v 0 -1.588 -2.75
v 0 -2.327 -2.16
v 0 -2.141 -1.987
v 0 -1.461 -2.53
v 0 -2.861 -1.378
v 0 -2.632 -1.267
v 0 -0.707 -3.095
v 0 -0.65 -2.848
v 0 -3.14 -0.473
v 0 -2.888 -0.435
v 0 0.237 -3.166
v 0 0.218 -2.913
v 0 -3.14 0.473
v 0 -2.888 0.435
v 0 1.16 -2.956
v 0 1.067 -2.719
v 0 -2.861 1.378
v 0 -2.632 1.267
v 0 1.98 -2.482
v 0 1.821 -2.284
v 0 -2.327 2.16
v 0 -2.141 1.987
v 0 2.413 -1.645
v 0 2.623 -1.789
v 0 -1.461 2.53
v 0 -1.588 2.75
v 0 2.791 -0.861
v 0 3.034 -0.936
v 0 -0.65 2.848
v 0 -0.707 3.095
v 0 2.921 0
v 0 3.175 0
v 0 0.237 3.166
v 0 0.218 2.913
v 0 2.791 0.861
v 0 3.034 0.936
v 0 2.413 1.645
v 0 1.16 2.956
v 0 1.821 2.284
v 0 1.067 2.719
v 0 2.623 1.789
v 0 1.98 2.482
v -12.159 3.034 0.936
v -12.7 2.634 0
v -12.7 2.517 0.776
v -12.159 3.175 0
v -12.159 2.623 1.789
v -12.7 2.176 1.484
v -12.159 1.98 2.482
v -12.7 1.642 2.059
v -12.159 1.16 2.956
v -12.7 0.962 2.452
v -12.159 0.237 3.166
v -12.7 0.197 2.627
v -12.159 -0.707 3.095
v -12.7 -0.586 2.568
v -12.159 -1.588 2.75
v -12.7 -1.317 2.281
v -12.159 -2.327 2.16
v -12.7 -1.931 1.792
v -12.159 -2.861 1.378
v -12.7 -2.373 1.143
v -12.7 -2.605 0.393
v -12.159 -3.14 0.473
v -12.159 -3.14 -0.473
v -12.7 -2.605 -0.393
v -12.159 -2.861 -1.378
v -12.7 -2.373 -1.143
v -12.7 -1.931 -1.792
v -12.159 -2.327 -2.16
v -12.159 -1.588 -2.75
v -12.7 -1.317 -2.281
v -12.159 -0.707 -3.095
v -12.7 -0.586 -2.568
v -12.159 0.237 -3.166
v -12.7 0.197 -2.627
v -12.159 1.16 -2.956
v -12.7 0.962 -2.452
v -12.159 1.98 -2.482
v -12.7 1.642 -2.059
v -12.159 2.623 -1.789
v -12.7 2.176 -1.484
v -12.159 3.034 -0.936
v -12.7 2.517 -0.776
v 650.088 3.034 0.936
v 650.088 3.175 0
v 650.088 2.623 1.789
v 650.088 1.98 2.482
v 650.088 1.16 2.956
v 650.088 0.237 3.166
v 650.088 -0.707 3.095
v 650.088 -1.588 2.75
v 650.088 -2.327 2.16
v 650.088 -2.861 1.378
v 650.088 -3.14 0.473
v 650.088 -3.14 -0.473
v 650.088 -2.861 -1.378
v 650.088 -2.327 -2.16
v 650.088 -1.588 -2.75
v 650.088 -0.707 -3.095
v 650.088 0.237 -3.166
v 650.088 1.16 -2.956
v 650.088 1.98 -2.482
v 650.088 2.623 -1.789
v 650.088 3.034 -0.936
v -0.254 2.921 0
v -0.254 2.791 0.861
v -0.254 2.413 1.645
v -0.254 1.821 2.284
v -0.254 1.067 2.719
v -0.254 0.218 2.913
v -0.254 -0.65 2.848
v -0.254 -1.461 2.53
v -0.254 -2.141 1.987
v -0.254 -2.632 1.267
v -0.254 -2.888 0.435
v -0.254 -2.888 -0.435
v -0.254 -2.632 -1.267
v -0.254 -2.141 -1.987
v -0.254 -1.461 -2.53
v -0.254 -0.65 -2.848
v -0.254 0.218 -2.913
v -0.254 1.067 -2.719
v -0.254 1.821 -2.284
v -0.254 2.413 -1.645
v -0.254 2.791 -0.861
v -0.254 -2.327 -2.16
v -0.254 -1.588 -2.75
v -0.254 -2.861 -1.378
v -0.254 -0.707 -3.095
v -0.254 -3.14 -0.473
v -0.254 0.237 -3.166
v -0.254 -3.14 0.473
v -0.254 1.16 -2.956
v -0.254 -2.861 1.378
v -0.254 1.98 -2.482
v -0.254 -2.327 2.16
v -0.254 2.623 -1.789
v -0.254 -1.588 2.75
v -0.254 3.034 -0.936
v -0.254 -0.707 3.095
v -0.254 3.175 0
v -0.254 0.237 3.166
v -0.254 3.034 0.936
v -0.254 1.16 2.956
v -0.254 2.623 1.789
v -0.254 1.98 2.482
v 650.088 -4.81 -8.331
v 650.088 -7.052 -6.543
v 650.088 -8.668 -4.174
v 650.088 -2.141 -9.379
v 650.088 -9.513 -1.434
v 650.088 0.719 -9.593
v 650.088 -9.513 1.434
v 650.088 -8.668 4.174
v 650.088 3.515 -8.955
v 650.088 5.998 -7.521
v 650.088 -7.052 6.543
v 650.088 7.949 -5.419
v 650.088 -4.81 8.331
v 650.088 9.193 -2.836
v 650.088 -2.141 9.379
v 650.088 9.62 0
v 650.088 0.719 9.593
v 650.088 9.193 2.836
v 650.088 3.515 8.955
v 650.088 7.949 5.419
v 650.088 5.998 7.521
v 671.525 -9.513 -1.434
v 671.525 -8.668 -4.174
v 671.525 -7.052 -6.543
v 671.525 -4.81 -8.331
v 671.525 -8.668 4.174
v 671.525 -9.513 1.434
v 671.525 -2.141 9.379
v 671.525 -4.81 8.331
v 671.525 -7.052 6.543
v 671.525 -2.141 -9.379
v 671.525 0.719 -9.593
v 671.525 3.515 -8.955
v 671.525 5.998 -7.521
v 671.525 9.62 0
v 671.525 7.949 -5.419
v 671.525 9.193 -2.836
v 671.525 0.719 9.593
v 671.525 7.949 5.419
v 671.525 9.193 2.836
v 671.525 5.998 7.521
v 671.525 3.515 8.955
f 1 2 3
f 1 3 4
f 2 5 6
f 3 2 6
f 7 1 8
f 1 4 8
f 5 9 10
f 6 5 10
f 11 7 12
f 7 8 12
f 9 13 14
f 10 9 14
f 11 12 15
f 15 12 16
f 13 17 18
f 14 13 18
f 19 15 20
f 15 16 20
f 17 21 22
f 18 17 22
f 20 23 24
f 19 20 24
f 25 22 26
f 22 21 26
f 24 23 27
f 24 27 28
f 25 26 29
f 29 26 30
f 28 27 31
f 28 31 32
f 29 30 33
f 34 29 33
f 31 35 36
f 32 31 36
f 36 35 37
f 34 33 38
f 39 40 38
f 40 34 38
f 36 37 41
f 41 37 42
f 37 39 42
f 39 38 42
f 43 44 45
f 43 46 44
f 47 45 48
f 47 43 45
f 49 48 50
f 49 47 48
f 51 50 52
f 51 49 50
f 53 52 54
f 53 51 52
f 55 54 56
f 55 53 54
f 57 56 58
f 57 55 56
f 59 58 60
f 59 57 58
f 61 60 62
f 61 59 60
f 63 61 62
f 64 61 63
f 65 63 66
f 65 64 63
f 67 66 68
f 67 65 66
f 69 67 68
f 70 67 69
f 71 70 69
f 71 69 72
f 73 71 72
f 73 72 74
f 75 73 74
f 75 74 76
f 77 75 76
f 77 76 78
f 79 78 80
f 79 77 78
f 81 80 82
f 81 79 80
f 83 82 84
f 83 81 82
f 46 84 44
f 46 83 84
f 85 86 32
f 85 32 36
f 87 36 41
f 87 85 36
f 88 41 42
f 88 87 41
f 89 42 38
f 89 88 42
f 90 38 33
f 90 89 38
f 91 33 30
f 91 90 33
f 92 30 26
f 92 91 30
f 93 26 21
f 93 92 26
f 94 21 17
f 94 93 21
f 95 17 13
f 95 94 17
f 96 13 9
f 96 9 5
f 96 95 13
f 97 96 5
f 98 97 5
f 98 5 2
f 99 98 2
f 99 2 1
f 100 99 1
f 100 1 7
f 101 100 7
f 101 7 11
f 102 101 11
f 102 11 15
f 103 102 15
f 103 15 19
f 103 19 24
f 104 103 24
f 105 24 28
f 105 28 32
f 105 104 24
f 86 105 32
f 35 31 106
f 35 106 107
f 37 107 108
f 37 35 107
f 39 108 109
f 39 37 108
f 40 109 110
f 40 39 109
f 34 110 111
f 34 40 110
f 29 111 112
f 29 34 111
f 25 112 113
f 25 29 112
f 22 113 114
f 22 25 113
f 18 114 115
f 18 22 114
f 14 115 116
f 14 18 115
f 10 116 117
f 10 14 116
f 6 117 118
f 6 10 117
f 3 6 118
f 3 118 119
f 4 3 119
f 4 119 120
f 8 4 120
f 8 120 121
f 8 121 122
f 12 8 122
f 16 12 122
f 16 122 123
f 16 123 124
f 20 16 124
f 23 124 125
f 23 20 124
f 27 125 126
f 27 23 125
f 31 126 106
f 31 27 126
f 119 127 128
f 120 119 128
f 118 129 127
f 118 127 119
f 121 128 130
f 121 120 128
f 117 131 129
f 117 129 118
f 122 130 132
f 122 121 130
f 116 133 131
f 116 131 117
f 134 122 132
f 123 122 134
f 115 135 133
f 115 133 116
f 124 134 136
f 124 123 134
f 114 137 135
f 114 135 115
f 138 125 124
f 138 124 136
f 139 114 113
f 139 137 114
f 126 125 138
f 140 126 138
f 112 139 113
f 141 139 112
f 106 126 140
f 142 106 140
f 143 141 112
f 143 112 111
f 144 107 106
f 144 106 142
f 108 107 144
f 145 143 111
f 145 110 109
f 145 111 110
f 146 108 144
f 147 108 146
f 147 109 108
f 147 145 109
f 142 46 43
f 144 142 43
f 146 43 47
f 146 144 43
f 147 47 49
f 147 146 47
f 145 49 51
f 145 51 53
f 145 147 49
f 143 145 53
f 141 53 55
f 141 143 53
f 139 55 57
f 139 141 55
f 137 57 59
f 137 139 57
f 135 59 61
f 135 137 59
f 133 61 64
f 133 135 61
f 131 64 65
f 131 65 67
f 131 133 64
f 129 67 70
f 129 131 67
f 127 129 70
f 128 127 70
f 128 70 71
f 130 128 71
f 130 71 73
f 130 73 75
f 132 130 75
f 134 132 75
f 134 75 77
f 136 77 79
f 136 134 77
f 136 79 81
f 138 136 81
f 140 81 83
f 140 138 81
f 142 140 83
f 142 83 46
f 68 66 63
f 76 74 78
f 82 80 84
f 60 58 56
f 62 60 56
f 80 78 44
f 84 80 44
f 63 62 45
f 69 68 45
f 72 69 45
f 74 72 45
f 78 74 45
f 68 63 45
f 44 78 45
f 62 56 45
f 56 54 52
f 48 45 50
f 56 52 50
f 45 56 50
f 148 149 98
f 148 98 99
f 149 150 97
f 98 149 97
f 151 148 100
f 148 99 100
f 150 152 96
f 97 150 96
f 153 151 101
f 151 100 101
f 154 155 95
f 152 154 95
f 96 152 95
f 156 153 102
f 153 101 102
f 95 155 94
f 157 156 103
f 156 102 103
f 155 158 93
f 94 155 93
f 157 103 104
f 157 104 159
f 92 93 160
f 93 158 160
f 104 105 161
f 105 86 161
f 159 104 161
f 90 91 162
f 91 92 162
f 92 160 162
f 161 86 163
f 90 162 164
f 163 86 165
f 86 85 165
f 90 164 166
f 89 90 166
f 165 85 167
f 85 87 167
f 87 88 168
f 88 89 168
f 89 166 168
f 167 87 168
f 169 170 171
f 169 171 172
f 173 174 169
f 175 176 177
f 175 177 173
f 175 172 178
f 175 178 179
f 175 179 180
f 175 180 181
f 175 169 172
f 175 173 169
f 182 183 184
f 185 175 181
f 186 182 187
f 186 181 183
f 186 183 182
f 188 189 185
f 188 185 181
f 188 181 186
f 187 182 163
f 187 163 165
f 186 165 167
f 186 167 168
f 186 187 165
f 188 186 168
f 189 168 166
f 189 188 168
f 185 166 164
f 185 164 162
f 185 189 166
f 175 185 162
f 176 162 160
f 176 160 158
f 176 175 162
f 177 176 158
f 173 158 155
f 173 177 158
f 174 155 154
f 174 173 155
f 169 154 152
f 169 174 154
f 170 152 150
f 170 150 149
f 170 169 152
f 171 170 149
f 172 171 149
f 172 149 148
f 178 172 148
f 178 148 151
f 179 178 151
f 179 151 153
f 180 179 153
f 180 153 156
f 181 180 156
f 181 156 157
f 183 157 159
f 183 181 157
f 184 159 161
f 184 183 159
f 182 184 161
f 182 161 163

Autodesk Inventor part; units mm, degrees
sketch "Sketch_1" plane through (0, 0, 0) normal (0, 0, 1) x (1, 0, 0)
  line L0 (671.5252, 0) -> (0, 0)
  line L1 (0, 0) -> (0, 3.175)
  line L2 (0, 3.175) -> (650.0876, 3.175)
  line L3 (650.0876, 3.175) -> (650.0876, 9.6203)
  line L4 (650.0876, 9.6203) -> (671.5252, 9.6203)
  line L5 (671.5252, 9.6203) -> (671.5252, 0)
  line L6 (671.5252, 0) -> (0, 0)
revolve "Revolution1" add sketch "Sketch_1" angle 360 about axis through (671.5252, 0, 0) along (1, 0, 0)
sketch "Sketch_3" plane through (0, 0, 0) normal (0, 0, 1) x (1, 0, 0)
  line L0 (0, 0) -> (-12.7, 0)
  line L1 (-12.7, 0) -> (-12.7, 2.634)
  line L2 (-12.7, 2.634) -> (-12.159, 3.175)
  line L3 (-12.159, 3.175) -> (0, 3.175)
  line L4 (0, 3.175) -> (0, 0)
  line L5 (0, 0) -> (-12.7, 0)
revolve "Revolution2" add sketch "Sketch_3" angle 360 about axis through (0, 0, 0) along (1, 0, 0)
thread "Thread1" size "1/4-28 UNF" class "2A" standard "ANSI Unified Screw Threads" length 12.159
sketch "Sketch_30" plane through (0, 0, 0) normal (0, 0, 1) x (1, 0, 0)
  line L0 (0, 0) -> (-0.254, 0)
  line L1 (-0.254, 2.921) -> (0, 2.921)
  line L2 (0, 2.921) -> (0, 3.429)
  line L3 (0, 3.429) -> (-0.254, 3.429)
  line L4 (-0.254, 3.429) -> (-0.254, 2.921)
revolve "Revolution3" cut sketch "Sketch_30" angle 360 about axis through (0, 0, 0) along (1, 0, 0)
ref_plane "dia1_XY" through (0, 3.175, 0) normal (1, 0, 0) x (0, 0, -1)
ref_plane "dia1_YZ" through (0, 3.175, 0) normal (0, 0, -1) x (0, 1, 0)
ref_plane "dia1_ZX" through (0, 3.175, 0) normal (0, 1, 0) x (1, 0, 0)
ref_plane "dia12_XY" through (0, 0, 10.9537) normal (1, 0, 0) x (0, 0, -1)
ref_plane "dia12_YZ" through (0, 0, 10.9537) normal (0, 0, -1) x (0, 1, 0)
ref_plane "dia12_ZX" through (0, 0, 10.9537) normal (0, 1, 0) x (1, 0, 0)
ref_plane "dia2_XY" through (0, -3.175, 0) normal (1, 0, 0) x (0, 0, -1)
ref_plane "dia2_YZ" through (0, -3.175, 0) normal (0, 0, -1) x (0, 1, 0)
ref_plane "dia2_ZX" through (0, -3.175, 0) normal (0, 1, 0) x (1, 0, 0)
ref_plane "dia22_XY" through (0, 0, -10.9537) normal (1, 0, 0) x (0, 0, -1)
ref_plane "dia22_YZ" through (0, 0, -10.9537) normal (0, 0, -1) x (0, 1, 0)
ref_plane "dia22_ZX" through (0, 0, -10.9537) normal (0, 1, 0) x (1, 0, 0)
ref_plane "rl1_XY" through (-12.7, 0, 0) normal (1, 0, 0) x (0, 0, -1)
ref_plane "rl1_YZ" through (-12.7, 0, 0) normal (0, 0, -1) x (0, 1, 0)
ref_plane "rl1_ZX" through (-12.7, 0, 0) normal (0, 1, 0) x (1, 0, 0)
ref_plane "rl2_XY" through (0, 0, 0) normal (1, 0, 0) x (0, 0, -1)
ref_plane "rl2_YZ" through (0, 0, 0) normal (0, 0, -1) x (0, 1, 0)
ref_plane "rl2_ZX" through (0, 0, 0) normal (0, 1, 0) x (1, 0, 0)
ref_plane "rod_cp_XY" through (0, 0, 0) normal (1, 0, 0) x (0, 0, -1)
ref_plane "rod_cp_YZ" through (0, 0, 0) normal (0, 0, -1) x (0, 1, 0)
ref_plane "rod_cp_ZX" through (0, 0, 0) normal (0, 1, 0) x (1, 0, 0)
ref_plane "thd1_XY" through (-12.7, 3.175, 0) normal (1, 0, 0) x (0, 0, -1)
ref_plane "thd1_YZ" through (-12.7, 3.175, 0) normal (0, 0, -1) x (0, 1, 0)
ref_plane "thd1_ZX" through (-12.7, 3.175, 0) normal (0, 1, 0) x (1, 0, 0)
ref_plane "thd2_XY" through (-12.7, -3.175, 0) normal (1, 0, 0) x (0, 0, -1)
ref_plane "thd2_YZ" through (-12.7, -3.175, 0) normal (0, 0, -1) x (0, 1, 0)
ref_plane "thd2_ZX" through (-12.7, -3.175, 0) normal (0, 1, 0) x (1, 0, 0)
ref_plane "to_rod_clevis_XY" through (-16.764, 0, 0) normal (1, 0, 0) x (0, 0, -1)
ref_plane "to_rod_clevis_YZ" through (-16.764, 0, 0) normal (0, 0, -1) x (0, 1, 0)
ref_plane "to_rod_clevis_ZX" through (-16.764, 0, 0) normal (0, 1, 0) x (1, 0, 0)
properties part number "SR-0424-DPY0000_rod"
